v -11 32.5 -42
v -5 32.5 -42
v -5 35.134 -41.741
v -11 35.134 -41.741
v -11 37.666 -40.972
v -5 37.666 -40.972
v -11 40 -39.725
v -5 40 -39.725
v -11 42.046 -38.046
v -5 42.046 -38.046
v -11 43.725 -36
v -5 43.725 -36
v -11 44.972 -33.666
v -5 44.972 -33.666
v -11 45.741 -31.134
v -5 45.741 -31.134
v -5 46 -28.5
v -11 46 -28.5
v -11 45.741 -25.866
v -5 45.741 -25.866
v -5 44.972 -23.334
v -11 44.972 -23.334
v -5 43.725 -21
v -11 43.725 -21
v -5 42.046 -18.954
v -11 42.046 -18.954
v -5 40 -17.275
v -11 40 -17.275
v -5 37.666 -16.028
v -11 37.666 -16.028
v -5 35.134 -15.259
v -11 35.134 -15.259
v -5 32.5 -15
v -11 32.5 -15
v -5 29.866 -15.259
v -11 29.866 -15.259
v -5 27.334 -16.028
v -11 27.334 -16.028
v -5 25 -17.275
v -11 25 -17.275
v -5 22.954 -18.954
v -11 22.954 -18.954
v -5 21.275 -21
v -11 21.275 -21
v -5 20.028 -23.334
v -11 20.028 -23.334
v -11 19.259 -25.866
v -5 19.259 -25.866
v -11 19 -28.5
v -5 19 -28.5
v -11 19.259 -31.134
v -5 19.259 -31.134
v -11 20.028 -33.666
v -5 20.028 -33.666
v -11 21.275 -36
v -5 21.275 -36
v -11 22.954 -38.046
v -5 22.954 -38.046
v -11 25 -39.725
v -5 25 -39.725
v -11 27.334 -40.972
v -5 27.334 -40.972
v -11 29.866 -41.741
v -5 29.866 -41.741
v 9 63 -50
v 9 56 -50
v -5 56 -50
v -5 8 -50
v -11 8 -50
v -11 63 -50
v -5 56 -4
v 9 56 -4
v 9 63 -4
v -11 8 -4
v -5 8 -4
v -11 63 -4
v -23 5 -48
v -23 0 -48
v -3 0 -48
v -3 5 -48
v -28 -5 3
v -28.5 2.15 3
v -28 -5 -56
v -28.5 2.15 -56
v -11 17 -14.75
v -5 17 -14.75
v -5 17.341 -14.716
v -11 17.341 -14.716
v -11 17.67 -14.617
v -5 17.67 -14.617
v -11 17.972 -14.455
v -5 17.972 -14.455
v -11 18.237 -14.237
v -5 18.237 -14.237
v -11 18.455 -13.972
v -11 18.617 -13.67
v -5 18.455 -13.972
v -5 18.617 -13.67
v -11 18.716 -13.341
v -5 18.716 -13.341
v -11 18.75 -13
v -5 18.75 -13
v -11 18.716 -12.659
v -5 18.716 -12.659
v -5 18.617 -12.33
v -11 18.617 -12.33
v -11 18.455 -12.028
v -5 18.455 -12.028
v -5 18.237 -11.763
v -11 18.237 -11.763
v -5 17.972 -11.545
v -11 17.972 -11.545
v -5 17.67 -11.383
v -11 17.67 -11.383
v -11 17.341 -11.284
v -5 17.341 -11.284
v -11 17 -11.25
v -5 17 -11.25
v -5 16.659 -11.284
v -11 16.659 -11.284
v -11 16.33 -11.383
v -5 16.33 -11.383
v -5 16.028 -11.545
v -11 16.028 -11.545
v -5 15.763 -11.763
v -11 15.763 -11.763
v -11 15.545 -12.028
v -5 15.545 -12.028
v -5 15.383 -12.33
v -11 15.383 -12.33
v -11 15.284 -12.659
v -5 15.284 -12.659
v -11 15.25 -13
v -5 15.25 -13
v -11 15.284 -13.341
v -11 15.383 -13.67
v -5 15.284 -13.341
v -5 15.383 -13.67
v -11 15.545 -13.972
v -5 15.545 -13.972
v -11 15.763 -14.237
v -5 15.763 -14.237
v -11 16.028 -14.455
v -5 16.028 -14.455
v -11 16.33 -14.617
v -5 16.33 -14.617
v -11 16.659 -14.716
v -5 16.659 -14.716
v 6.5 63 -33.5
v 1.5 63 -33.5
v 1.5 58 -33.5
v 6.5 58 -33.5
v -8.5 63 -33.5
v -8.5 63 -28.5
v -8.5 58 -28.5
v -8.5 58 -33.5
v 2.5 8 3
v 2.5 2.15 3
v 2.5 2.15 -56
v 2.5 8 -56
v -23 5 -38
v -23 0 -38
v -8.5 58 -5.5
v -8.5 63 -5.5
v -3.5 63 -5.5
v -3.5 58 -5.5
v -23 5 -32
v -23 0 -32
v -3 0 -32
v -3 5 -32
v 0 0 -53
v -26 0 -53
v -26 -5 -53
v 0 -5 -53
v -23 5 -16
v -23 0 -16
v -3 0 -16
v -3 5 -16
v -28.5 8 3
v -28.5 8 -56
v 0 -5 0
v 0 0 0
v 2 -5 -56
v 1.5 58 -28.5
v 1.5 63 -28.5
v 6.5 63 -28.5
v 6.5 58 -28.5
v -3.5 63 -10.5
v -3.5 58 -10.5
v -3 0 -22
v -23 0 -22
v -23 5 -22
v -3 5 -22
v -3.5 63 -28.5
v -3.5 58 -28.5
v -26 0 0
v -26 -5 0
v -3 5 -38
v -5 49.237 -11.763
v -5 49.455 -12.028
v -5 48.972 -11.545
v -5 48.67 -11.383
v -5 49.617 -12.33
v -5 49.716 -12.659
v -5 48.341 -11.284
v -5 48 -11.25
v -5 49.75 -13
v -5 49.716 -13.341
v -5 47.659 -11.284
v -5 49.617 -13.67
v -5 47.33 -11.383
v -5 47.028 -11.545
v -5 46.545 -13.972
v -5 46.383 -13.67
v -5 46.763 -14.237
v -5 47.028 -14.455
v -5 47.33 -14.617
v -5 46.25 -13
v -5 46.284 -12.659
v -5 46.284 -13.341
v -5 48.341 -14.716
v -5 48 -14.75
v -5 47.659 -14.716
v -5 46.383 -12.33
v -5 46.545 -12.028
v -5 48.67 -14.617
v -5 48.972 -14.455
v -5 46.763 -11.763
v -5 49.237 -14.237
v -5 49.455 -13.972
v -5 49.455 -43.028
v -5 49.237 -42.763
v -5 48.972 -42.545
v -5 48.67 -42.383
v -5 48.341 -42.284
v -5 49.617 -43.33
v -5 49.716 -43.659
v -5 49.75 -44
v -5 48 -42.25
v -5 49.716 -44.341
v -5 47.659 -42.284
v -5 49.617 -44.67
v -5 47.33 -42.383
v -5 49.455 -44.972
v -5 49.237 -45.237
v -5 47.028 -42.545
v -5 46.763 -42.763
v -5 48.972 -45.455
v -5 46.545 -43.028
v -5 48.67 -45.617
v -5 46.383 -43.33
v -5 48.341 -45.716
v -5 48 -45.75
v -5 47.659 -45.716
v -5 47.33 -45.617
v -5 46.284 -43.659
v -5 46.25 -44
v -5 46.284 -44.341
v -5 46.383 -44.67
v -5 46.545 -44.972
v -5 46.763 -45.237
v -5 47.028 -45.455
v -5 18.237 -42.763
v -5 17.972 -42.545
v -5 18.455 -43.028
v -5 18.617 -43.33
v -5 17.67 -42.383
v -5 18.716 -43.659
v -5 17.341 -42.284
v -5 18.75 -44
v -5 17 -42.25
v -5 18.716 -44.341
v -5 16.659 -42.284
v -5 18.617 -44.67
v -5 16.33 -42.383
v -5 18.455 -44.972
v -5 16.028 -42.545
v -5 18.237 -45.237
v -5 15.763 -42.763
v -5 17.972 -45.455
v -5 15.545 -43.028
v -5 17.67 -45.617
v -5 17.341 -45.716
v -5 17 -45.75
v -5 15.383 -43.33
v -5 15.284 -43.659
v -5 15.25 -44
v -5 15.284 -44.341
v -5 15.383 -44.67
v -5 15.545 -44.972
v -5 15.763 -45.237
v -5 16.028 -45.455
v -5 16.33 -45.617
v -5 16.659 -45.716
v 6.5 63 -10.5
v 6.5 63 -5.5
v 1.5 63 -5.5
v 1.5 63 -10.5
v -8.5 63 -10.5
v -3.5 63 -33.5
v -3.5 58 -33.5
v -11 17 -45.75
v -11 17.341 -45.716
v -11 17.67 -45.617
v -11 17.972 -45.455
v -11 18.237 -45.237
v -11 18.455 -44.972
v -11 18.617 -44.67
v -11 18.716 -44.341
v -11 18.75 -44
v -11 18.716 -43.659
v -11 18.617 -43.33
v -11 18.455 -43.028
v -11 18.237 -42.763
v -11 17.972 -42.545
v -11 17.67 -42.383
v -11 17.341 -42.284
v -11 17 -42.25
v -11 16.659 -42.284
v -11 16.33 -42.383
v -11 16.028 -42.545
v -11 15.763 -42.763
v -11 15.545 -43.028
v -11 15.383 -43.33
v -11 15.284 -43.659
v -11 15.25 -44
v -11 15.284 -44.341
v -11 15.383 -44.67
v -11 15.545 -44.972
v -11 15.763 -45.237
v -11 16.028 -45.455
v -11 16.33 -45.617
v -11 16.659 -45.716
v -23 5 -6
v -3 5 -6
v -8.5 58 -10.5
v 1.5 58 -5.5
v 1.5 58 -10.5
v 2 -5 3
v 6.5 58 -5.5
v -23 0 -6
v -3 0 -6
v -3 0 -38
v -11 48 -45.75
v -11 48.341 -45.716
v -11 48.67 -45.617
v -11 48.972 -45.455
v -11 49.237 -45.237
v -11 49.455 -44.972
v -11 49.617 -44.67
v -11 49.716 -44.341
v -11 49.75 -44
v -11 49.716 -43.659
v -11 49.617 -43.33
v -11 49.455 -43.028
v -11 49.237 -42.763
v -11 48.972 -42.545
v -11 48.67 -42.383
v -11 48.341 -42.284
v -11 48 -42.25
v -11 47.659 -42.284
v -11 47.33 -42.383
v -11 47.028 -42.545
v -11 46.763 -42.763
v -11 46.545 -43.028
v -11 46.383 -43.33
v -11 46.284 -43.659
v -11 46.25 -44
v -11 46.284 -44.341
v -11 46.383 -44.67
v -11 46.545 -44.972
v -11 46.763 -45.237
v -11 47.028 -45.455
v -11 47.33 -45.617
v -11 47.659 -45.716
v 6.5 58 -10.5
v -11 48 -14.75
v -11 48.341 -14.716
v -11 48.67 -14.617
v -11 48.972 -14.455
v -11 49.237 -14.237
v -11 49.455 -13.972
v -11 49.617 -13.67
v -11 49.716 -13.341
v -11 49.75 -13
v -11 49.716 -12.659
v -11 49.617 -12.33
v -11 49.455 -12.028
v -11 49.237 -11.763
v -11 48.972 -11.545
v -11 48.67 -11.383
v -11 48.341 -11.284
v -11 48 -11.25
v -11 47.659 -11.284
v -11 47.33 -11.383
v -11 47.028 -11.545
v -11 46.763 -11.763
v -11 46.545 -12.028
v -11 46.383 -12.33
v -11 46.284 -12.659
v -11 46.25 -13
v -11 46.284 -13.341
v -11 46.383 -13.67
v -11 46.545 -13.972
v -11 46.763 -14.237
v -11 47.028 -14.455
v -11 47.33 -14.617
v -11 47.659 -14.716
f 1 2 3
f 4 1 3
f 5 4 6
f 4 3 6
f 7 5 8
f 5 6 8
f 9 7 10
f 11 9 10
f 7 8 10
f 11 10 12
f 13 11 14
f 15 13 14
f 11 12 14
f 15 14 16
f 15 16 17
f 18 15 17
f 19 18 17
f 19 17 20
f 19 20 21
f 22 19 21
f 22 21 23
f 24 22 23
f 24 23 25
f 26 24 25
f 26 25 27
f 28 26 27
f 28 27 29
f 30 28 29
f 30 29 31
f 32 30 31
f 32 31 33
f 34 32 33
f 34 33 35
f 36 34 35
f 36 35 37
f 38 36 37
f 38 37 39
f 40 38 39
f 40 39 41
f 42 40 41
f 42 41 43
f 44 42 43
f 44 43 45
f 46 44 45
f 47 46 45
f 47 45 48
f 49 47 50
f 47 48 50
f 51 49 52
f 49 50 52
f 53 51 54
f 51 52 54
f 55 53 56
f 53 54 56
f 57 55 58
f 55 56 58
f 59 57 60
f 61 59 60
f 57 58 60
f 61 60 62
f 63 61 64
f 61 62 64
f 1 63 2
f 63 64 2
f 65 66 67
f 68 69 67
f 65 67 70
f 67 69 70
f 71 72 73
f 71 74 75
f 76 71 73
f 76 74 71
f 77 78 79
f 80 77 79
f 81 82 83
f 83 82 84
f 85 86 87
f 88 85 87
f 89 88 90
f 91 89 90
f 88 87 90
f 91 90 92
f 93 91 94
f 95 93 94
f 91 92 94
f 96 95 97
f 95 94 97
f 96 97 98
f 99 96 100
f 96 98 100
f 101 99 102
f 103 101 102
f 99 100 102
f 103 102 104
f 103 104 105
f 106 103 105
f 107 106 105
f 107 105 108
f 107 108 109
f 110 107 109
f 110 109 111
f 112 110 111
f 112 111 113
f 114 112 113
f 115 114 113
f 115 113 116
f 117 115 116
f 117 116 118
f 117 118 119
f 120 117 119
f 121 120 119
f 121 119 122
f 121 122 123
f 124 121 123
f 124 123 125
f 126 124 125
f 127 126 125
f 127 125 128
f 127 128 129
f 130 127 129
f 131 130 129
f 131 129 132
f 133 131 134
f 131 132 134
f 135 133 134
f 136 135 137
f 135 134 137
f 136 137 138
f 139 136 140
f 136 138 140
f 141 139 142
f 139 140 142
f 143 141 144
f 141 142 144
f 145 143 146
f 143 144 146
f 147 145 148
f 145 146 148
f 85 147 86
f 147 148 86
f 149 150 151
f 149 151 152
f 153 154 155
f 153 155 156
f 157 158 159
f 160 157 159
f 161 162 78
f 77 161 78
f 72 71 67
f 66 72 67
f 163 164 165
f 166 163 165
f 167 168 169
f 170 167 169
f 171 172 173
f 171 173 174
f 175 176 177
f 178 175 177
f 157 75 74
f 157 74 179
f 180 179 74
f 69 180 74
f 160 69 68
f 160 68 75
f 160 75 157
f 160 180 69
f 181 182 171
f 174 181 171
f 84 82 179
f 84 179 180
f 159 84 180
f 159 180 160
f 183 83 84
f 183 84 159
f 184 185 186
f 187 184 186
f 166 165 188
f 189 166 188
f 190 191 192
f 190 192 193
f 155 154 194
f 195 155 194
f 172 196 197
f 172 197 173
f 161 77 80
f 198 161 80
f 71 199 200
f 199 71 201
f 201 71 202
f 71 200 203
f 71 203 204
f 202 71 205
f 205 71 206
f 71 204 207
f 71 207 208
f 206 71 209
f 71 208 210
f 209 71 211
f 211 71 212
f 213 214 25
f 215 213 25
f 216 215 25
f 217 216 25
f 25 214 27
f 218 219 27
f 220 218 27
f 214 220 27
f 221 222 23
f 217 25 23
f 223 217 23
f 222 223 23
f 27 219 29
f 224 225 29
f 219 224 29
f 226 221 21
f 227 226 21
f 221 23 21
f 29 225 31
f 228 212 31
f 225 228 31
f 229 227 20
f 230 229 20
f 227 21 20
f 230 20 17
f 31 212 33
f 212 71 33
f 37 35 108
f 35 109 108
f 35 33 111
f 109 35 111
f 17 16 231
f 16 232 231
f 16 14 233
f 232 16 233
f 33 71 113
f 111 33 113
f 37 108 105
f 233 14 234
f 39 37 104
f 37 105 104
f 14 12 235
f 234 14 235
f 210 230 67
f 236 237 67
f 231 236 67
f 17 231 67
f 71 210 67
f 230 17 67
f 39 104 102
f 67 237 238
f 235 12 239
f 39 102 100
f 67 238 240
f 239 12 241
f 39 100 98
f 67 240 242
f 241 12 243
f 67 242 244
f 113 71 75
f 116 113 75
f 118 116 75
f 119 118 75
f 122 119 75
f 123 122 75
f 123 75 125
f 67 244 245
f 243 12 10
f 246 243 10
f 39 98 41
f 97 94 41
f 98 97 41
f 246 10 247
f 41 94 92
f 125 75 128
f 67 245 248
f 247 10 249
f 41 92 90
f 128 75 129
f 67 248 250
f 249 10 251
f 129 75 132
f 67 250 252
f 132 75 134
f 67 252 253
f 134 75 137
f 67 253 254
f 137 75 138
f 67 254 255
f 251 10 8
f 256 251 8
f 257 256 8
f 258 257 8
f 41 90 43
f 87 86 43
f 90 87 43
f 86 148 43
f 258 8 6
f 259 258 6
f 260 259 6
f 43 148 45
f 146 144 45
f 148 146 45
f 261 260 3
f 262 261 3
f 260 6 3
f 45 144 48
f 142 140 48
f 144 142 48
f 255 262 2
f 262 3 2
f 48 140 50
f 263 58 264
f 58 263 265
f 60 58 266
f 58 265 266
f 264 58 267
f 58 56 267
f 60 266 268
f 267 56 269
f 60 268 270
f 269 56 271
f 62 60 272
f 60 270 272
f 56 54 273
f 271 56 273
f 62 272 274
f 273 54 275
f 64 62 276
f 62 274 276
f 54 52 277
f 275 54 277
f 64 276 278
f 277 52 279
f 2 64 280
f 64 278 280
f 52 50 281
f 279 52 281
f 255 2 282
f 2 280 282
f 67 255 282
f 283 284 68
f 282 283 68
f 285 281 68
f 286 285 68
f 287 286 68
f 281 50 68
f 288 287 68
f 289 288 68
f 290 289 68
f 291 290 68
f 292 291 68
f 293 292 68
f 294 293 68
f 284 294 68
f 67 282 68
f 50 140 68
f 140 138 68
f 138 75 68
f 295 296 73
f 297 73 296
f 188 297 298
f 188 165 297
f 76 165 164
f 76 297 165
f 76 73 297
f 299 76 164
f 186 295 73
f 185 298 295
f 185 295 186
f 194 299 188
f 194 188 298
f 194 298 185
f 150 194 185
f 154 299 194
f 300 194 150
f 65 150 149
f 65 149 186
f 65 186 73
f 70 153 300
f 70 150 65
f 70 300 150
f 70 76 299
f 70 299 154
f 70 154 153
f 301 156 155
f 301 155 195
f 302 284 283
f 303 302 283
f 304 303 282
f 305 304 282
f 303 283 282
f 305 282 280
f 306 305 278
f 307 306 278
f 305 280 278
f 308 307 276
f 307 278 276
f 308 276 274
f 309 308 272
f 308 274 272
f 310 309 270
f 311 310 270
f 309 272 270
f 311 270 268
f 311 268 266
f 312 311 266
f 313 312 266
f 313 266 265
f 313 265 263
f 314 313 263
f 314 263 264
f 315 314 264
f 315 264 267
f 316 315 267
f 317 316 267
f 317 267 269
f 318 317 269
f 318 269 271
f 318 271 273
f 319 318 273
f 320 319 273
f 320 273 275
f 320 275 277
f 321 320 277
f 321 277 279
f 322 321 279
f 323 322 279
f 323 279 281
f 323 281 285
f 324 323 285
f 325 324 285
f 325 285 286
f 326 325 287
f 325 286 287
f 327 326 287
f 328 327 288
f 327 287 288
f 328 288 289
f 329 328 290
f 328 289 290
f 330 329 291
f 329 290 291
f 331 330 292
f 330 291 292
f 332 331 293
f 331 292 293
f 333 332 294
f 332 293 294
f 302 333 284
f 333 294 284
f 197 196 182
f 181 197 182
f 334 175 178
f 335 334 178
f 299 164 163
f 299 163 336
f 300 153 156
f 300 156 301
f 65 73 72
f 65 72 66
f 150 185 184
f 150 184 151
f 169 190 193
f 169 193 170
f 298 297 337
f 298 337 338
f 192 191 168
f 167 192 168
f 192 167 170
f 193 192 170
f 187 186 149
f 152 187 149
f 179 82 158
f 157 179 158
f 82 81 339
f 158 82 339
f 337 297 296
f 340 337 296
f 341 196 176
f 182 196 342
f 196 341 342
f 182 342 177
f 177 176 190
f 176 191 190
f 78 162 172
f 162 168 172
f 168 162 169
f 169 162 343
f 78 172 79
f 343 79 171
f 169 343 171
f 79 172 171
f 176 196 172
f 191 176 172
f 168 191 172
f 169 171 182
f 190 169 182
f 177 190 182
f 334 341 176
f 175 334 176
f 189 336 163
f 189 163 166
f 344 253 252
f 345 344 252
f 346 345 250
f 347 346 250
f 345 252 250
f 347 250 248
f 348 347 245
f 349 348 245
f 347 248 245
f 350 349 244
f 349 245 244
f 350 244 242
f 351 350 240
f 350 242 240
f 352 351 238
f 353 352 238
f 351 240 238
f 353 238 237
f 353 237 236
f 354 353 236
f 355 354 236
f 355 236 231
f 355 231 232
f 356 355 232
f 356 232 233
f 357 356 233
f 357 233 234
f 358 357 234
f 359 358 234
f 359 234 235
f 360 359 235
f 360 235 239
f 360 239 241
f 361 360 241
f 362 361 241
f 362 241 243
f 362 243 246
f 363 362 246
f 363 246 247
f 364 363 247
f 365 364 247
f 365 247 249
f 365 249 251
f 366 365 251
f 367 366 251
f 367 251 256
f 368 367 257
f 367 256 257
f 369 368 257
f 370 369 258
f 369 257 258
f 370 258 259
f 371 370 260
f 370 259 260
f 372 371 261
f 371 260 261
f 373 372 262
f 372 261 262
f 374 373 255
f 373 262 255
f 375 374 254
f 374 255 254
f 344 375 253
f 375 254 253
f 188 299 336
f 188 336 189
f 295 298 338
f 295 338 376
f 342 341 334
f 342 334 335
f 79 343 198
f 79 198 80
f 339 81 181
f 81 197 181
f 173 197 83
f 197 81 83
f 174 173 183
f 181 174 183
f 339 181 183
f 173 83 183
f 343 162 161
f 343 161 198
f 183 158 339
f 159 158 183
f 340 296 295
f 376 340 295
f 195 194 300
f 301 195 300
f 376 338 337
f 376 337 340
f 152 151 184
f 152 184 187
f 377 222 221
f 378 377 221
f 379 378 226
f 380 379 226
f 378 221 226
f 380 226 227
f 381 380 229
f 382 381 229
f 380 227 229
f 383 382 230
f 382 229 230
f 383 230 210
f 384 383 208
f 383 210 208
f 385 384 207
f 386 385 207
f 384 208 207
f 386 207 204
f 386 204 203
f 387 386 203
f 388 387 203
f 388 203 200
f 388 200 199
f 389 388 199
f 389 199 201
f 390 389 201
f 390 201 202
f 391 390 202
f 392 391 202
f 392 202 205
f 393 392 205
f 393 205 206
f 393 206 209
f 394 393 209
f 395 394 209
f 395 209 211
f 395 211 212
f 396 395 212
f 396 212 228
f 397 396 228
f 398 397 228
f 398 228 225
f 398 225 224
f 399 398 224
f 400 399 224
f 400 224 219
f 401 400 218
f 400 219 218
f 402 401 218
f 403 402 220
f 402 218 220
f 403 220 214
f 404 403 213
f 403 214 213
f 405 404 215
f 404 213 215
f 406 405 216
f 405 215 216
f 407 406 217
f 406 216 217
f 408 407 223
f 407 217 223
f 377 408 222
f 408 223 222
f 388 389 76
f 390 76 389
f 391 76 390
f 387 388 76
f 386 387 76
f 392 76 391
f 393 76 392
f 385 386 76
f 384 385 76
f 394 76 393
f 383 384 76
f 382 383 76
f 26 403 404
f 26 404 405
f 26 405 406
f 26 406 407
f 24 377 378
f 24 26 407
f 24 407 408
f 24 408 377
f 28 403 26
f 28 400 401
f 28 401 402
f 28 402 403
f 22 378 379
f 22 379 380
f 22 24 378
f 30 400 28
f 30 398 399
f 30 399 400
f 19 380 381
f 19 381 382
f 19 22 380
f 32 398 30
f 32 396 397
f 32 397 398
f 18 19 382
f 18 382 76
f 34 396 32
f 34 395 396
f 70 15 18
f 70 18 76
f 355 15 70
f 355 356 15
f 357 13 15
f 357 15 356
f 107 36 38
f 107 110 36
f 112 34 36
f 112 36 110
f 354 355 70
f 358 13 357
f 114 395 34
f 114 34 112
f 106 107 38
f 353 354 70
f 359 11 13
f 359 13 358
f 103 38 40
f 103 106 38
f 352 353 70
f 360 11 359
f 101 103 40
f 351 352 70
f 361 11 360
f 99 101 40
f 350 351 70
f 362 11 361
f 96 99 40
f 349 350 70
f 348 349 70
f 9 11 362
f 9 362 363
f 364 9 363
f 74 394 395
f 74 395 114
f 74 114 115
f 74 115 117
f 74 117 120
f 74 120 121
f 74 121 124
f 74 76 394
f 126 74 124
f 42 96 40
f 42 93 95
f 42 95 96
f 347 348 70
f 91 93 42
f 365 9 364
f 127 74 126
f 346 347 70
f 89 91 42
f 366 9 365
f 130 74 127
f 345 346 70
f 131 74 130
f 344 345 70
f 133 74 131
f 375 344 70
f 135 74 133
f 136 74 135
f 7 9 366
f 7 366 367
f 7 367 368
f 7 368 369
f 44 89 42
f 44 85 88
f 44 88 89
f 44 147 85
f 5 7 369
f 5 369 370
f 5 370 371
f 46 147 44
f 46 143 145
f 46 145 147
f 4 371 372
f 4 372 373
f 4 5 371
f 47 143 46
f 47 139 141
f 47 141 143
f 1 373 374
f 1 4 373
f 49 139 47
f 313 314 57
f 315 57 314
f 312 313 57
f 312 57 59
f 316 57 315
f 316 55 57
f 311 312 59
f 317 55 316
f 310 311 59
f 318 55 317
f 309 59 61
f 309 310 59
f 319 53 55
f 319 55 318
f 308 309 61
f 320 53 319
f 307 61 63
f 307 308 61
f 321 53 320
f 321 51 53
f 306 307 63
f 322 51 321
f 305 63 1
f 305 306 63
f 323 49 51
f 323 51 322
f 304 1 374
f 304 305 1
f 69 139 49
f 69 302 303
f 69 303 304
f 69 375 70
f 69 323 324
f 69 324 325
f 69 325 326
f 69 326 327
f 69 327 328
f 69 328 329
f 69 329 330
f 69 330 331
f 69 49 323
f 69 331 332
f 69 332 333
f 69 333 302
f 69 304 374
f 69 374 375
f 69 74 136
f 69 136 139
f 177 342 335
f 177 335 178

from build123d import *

# Parameters (mm, degrees)
SKETCH1_W           = 26
SKETCH1_H           = 53
SKETCH1_W_2         = 20
SKETCH1_H_2         = 10
BOSS_EXTRUDE1_DEPTH = 5
SKETCH2_W           = 31
SKETCH2_H           = 59
SKETCH2_W_2         = 26
SKETCH2_H_2         = 53
BOSS_EXTRUDE2_DEPTH = 10
SKETCH3_W           = 31
SKETCH3_H           = 59
BOSS_EXTRUDE3_DEPTH = 3
SKETCH4_W           = 6
SKETCH4_H           = 46
BOSS_EXTRUDE4_DEPTH = 55
SKETCH5_R           = 1.75
SKETCH5_R_2         = 13.5
CUT_EXTRUDE1_DEPTH  = 24.5
CHAMFER1_SIZE       = 0.5
CHAMFER1_SIZE2      = 7.150333128
SKETCH6_W           = 46
SKETCH6_H           = 7
BOSS_EXTRUDE5_DEPTH = 14
SKETCH7_W           = 5
SKETCH7_H           = 5
CUT_EXTRUDE2_DEPTH  = 5


with BuildPart() as part:
    # Sketch1 → Boss-Extrude1 (new body)
    with BuildSketch(Plane(origin=(0, 0, 0), x_dir=(1, 0, 0), z_dir=(0, 1, 0))):
        with Locations((-13, 26.5)):
            Rectangle(SKETCH1_W, SKETCH1_H)
        with Locations((-13, 27)):
            Rectangle(SKETCH1_W_2, SKETCH1_H_2, mode=Mode.SUBTRACT)
        with Locations((-13, 43)):
            Rectangle(SKETCH1_W_2, SKETCH1_H_2, mode=Mode.SUBTRACT)
        with Locations((-13, 11)):
            Rectangle(SKETCH1_W_2, SKETCH1_H_2, mode=Mode.SUBTRACT)
    extrude(amount=BOSS_EXTRUDE1_DEPTH)

    # Sketch2 → Boss-Extrude2 (add)
    with BuildSketch(Plane(origin=(0, 5, 0), x_dir=(1, 0, 0), z_dir=(0, 1, 0))):
        with Locations((-13, 26.5)):
            Rectangle(SKETCH2_W, SKETCH2_H)
        with Locations((-13, 26.5)):
            Rectangle(SKETCH2_W_2, SKETCH2_H_2, mode=Mode.SUBTRACT)
    extrude(amount=-BOSS_EXTRUDE2_DEPTH)

    # Sketch3 → Boss-Extrude3 (add)
    with BuildSketch(Plane(origin=(0, 5, 0), x_dir=(1, 0, 0), z_dir=(0, 1, 0))):
        with Locations((-13, 26.5)):
            Rectangle(SKETCH3_W, SKETCH3_H)
    extrude(amount=BOSS_EXTRUDE3_DEPTH)

    # Sketch4 → Boss-Extrude4 (add)
    with BuildSketch(Plane(origin=(0, 8, 0), x_dir=(1, 0, 0), z_dir=(0, 1, 0))):
        with Locations((-8, 27)):
            Rectangle(SKETCH4_W, SKETCH4_H)
    extrude(amount=BOSS_EXTRUDE4_DEPTH)

    # Sketch5 → Cut-Extrude1 (cut, through all)
    with BuildSketch(Plane(origin=(-5, 0, 0), x_dir=(0, 0, -1), z_dir=(1, 0, 0))):
        with Locations((44, 17)):
            Circle(SKETCH5_R)
        with Locations((13, 17)):
            Circle(SKETCH5_R)
        with Locations((13, 48)):
            Circle(SKETCH5_R)
        with Locations((44, 48)):
            Circle(SKETCH5_R)
        with Locations((28.5, 32.5)):
            Circle(SKETCH5_R_2)
    extrude(amount=-CUT_EXTRUDE1_DEPTH, mode=Mode.SUBTRACT)

    # Chamfer1
    chamfer1_edges = [part.edges().sort_by_distance(p)[0] for p in [
        (-28.5, -5, -26.5),
        (2.5, -5, -26.5),
    ]]
    chamfer1_side = [part.faces().sort_by_distance(p)[0] for p in [
        (-13, -5, -55.333516692),
    ]]
    chamfer(chamfer1_edges, length=CHAMFER1_SIZE, length2=CHAMFER1_SIZE2, reference=chamfer1_side[0])

    # Sketch6 → Boss-Extrude5 (add)
    with BuildSketch(Plane(origin=(-5, 0, 0), x_dir=(0, 0, -1), z_dir=(1, 0, 0))):
        with Locations((27, 59.5)):
            Rectangle(SKETCH6_W, SKETCH6_H)
    extrude(amount=BOSS_EXTRUDE5_DEPTH)

    # Sketch7 → Cut-Extrude2 (cut)
    with BuildSketch(Plane(origin=(0, 63, 0), x_dir=(1, 0, 0), z_dir=(0, 1, 0))):
        with Locations((-6, 31)):
            Rectangle(SKETCH7_W, SKETCH7_H)
        with Locations((4, 31)):
            Rectangle(SKETCH7_W, SKETCH7_H)
        with Locations((-6, 8)):
            Rectangle(SKETCH7_W, SKETCH7_H)
        with Locations((4, 8)):
            Rectangle(SKETCH7_W, SKETCH7_H)
    extrude(amount=-CUT_EXTRUDE2_DEPTH, mode=Mode.SUBTRACT)


solid = part.part
